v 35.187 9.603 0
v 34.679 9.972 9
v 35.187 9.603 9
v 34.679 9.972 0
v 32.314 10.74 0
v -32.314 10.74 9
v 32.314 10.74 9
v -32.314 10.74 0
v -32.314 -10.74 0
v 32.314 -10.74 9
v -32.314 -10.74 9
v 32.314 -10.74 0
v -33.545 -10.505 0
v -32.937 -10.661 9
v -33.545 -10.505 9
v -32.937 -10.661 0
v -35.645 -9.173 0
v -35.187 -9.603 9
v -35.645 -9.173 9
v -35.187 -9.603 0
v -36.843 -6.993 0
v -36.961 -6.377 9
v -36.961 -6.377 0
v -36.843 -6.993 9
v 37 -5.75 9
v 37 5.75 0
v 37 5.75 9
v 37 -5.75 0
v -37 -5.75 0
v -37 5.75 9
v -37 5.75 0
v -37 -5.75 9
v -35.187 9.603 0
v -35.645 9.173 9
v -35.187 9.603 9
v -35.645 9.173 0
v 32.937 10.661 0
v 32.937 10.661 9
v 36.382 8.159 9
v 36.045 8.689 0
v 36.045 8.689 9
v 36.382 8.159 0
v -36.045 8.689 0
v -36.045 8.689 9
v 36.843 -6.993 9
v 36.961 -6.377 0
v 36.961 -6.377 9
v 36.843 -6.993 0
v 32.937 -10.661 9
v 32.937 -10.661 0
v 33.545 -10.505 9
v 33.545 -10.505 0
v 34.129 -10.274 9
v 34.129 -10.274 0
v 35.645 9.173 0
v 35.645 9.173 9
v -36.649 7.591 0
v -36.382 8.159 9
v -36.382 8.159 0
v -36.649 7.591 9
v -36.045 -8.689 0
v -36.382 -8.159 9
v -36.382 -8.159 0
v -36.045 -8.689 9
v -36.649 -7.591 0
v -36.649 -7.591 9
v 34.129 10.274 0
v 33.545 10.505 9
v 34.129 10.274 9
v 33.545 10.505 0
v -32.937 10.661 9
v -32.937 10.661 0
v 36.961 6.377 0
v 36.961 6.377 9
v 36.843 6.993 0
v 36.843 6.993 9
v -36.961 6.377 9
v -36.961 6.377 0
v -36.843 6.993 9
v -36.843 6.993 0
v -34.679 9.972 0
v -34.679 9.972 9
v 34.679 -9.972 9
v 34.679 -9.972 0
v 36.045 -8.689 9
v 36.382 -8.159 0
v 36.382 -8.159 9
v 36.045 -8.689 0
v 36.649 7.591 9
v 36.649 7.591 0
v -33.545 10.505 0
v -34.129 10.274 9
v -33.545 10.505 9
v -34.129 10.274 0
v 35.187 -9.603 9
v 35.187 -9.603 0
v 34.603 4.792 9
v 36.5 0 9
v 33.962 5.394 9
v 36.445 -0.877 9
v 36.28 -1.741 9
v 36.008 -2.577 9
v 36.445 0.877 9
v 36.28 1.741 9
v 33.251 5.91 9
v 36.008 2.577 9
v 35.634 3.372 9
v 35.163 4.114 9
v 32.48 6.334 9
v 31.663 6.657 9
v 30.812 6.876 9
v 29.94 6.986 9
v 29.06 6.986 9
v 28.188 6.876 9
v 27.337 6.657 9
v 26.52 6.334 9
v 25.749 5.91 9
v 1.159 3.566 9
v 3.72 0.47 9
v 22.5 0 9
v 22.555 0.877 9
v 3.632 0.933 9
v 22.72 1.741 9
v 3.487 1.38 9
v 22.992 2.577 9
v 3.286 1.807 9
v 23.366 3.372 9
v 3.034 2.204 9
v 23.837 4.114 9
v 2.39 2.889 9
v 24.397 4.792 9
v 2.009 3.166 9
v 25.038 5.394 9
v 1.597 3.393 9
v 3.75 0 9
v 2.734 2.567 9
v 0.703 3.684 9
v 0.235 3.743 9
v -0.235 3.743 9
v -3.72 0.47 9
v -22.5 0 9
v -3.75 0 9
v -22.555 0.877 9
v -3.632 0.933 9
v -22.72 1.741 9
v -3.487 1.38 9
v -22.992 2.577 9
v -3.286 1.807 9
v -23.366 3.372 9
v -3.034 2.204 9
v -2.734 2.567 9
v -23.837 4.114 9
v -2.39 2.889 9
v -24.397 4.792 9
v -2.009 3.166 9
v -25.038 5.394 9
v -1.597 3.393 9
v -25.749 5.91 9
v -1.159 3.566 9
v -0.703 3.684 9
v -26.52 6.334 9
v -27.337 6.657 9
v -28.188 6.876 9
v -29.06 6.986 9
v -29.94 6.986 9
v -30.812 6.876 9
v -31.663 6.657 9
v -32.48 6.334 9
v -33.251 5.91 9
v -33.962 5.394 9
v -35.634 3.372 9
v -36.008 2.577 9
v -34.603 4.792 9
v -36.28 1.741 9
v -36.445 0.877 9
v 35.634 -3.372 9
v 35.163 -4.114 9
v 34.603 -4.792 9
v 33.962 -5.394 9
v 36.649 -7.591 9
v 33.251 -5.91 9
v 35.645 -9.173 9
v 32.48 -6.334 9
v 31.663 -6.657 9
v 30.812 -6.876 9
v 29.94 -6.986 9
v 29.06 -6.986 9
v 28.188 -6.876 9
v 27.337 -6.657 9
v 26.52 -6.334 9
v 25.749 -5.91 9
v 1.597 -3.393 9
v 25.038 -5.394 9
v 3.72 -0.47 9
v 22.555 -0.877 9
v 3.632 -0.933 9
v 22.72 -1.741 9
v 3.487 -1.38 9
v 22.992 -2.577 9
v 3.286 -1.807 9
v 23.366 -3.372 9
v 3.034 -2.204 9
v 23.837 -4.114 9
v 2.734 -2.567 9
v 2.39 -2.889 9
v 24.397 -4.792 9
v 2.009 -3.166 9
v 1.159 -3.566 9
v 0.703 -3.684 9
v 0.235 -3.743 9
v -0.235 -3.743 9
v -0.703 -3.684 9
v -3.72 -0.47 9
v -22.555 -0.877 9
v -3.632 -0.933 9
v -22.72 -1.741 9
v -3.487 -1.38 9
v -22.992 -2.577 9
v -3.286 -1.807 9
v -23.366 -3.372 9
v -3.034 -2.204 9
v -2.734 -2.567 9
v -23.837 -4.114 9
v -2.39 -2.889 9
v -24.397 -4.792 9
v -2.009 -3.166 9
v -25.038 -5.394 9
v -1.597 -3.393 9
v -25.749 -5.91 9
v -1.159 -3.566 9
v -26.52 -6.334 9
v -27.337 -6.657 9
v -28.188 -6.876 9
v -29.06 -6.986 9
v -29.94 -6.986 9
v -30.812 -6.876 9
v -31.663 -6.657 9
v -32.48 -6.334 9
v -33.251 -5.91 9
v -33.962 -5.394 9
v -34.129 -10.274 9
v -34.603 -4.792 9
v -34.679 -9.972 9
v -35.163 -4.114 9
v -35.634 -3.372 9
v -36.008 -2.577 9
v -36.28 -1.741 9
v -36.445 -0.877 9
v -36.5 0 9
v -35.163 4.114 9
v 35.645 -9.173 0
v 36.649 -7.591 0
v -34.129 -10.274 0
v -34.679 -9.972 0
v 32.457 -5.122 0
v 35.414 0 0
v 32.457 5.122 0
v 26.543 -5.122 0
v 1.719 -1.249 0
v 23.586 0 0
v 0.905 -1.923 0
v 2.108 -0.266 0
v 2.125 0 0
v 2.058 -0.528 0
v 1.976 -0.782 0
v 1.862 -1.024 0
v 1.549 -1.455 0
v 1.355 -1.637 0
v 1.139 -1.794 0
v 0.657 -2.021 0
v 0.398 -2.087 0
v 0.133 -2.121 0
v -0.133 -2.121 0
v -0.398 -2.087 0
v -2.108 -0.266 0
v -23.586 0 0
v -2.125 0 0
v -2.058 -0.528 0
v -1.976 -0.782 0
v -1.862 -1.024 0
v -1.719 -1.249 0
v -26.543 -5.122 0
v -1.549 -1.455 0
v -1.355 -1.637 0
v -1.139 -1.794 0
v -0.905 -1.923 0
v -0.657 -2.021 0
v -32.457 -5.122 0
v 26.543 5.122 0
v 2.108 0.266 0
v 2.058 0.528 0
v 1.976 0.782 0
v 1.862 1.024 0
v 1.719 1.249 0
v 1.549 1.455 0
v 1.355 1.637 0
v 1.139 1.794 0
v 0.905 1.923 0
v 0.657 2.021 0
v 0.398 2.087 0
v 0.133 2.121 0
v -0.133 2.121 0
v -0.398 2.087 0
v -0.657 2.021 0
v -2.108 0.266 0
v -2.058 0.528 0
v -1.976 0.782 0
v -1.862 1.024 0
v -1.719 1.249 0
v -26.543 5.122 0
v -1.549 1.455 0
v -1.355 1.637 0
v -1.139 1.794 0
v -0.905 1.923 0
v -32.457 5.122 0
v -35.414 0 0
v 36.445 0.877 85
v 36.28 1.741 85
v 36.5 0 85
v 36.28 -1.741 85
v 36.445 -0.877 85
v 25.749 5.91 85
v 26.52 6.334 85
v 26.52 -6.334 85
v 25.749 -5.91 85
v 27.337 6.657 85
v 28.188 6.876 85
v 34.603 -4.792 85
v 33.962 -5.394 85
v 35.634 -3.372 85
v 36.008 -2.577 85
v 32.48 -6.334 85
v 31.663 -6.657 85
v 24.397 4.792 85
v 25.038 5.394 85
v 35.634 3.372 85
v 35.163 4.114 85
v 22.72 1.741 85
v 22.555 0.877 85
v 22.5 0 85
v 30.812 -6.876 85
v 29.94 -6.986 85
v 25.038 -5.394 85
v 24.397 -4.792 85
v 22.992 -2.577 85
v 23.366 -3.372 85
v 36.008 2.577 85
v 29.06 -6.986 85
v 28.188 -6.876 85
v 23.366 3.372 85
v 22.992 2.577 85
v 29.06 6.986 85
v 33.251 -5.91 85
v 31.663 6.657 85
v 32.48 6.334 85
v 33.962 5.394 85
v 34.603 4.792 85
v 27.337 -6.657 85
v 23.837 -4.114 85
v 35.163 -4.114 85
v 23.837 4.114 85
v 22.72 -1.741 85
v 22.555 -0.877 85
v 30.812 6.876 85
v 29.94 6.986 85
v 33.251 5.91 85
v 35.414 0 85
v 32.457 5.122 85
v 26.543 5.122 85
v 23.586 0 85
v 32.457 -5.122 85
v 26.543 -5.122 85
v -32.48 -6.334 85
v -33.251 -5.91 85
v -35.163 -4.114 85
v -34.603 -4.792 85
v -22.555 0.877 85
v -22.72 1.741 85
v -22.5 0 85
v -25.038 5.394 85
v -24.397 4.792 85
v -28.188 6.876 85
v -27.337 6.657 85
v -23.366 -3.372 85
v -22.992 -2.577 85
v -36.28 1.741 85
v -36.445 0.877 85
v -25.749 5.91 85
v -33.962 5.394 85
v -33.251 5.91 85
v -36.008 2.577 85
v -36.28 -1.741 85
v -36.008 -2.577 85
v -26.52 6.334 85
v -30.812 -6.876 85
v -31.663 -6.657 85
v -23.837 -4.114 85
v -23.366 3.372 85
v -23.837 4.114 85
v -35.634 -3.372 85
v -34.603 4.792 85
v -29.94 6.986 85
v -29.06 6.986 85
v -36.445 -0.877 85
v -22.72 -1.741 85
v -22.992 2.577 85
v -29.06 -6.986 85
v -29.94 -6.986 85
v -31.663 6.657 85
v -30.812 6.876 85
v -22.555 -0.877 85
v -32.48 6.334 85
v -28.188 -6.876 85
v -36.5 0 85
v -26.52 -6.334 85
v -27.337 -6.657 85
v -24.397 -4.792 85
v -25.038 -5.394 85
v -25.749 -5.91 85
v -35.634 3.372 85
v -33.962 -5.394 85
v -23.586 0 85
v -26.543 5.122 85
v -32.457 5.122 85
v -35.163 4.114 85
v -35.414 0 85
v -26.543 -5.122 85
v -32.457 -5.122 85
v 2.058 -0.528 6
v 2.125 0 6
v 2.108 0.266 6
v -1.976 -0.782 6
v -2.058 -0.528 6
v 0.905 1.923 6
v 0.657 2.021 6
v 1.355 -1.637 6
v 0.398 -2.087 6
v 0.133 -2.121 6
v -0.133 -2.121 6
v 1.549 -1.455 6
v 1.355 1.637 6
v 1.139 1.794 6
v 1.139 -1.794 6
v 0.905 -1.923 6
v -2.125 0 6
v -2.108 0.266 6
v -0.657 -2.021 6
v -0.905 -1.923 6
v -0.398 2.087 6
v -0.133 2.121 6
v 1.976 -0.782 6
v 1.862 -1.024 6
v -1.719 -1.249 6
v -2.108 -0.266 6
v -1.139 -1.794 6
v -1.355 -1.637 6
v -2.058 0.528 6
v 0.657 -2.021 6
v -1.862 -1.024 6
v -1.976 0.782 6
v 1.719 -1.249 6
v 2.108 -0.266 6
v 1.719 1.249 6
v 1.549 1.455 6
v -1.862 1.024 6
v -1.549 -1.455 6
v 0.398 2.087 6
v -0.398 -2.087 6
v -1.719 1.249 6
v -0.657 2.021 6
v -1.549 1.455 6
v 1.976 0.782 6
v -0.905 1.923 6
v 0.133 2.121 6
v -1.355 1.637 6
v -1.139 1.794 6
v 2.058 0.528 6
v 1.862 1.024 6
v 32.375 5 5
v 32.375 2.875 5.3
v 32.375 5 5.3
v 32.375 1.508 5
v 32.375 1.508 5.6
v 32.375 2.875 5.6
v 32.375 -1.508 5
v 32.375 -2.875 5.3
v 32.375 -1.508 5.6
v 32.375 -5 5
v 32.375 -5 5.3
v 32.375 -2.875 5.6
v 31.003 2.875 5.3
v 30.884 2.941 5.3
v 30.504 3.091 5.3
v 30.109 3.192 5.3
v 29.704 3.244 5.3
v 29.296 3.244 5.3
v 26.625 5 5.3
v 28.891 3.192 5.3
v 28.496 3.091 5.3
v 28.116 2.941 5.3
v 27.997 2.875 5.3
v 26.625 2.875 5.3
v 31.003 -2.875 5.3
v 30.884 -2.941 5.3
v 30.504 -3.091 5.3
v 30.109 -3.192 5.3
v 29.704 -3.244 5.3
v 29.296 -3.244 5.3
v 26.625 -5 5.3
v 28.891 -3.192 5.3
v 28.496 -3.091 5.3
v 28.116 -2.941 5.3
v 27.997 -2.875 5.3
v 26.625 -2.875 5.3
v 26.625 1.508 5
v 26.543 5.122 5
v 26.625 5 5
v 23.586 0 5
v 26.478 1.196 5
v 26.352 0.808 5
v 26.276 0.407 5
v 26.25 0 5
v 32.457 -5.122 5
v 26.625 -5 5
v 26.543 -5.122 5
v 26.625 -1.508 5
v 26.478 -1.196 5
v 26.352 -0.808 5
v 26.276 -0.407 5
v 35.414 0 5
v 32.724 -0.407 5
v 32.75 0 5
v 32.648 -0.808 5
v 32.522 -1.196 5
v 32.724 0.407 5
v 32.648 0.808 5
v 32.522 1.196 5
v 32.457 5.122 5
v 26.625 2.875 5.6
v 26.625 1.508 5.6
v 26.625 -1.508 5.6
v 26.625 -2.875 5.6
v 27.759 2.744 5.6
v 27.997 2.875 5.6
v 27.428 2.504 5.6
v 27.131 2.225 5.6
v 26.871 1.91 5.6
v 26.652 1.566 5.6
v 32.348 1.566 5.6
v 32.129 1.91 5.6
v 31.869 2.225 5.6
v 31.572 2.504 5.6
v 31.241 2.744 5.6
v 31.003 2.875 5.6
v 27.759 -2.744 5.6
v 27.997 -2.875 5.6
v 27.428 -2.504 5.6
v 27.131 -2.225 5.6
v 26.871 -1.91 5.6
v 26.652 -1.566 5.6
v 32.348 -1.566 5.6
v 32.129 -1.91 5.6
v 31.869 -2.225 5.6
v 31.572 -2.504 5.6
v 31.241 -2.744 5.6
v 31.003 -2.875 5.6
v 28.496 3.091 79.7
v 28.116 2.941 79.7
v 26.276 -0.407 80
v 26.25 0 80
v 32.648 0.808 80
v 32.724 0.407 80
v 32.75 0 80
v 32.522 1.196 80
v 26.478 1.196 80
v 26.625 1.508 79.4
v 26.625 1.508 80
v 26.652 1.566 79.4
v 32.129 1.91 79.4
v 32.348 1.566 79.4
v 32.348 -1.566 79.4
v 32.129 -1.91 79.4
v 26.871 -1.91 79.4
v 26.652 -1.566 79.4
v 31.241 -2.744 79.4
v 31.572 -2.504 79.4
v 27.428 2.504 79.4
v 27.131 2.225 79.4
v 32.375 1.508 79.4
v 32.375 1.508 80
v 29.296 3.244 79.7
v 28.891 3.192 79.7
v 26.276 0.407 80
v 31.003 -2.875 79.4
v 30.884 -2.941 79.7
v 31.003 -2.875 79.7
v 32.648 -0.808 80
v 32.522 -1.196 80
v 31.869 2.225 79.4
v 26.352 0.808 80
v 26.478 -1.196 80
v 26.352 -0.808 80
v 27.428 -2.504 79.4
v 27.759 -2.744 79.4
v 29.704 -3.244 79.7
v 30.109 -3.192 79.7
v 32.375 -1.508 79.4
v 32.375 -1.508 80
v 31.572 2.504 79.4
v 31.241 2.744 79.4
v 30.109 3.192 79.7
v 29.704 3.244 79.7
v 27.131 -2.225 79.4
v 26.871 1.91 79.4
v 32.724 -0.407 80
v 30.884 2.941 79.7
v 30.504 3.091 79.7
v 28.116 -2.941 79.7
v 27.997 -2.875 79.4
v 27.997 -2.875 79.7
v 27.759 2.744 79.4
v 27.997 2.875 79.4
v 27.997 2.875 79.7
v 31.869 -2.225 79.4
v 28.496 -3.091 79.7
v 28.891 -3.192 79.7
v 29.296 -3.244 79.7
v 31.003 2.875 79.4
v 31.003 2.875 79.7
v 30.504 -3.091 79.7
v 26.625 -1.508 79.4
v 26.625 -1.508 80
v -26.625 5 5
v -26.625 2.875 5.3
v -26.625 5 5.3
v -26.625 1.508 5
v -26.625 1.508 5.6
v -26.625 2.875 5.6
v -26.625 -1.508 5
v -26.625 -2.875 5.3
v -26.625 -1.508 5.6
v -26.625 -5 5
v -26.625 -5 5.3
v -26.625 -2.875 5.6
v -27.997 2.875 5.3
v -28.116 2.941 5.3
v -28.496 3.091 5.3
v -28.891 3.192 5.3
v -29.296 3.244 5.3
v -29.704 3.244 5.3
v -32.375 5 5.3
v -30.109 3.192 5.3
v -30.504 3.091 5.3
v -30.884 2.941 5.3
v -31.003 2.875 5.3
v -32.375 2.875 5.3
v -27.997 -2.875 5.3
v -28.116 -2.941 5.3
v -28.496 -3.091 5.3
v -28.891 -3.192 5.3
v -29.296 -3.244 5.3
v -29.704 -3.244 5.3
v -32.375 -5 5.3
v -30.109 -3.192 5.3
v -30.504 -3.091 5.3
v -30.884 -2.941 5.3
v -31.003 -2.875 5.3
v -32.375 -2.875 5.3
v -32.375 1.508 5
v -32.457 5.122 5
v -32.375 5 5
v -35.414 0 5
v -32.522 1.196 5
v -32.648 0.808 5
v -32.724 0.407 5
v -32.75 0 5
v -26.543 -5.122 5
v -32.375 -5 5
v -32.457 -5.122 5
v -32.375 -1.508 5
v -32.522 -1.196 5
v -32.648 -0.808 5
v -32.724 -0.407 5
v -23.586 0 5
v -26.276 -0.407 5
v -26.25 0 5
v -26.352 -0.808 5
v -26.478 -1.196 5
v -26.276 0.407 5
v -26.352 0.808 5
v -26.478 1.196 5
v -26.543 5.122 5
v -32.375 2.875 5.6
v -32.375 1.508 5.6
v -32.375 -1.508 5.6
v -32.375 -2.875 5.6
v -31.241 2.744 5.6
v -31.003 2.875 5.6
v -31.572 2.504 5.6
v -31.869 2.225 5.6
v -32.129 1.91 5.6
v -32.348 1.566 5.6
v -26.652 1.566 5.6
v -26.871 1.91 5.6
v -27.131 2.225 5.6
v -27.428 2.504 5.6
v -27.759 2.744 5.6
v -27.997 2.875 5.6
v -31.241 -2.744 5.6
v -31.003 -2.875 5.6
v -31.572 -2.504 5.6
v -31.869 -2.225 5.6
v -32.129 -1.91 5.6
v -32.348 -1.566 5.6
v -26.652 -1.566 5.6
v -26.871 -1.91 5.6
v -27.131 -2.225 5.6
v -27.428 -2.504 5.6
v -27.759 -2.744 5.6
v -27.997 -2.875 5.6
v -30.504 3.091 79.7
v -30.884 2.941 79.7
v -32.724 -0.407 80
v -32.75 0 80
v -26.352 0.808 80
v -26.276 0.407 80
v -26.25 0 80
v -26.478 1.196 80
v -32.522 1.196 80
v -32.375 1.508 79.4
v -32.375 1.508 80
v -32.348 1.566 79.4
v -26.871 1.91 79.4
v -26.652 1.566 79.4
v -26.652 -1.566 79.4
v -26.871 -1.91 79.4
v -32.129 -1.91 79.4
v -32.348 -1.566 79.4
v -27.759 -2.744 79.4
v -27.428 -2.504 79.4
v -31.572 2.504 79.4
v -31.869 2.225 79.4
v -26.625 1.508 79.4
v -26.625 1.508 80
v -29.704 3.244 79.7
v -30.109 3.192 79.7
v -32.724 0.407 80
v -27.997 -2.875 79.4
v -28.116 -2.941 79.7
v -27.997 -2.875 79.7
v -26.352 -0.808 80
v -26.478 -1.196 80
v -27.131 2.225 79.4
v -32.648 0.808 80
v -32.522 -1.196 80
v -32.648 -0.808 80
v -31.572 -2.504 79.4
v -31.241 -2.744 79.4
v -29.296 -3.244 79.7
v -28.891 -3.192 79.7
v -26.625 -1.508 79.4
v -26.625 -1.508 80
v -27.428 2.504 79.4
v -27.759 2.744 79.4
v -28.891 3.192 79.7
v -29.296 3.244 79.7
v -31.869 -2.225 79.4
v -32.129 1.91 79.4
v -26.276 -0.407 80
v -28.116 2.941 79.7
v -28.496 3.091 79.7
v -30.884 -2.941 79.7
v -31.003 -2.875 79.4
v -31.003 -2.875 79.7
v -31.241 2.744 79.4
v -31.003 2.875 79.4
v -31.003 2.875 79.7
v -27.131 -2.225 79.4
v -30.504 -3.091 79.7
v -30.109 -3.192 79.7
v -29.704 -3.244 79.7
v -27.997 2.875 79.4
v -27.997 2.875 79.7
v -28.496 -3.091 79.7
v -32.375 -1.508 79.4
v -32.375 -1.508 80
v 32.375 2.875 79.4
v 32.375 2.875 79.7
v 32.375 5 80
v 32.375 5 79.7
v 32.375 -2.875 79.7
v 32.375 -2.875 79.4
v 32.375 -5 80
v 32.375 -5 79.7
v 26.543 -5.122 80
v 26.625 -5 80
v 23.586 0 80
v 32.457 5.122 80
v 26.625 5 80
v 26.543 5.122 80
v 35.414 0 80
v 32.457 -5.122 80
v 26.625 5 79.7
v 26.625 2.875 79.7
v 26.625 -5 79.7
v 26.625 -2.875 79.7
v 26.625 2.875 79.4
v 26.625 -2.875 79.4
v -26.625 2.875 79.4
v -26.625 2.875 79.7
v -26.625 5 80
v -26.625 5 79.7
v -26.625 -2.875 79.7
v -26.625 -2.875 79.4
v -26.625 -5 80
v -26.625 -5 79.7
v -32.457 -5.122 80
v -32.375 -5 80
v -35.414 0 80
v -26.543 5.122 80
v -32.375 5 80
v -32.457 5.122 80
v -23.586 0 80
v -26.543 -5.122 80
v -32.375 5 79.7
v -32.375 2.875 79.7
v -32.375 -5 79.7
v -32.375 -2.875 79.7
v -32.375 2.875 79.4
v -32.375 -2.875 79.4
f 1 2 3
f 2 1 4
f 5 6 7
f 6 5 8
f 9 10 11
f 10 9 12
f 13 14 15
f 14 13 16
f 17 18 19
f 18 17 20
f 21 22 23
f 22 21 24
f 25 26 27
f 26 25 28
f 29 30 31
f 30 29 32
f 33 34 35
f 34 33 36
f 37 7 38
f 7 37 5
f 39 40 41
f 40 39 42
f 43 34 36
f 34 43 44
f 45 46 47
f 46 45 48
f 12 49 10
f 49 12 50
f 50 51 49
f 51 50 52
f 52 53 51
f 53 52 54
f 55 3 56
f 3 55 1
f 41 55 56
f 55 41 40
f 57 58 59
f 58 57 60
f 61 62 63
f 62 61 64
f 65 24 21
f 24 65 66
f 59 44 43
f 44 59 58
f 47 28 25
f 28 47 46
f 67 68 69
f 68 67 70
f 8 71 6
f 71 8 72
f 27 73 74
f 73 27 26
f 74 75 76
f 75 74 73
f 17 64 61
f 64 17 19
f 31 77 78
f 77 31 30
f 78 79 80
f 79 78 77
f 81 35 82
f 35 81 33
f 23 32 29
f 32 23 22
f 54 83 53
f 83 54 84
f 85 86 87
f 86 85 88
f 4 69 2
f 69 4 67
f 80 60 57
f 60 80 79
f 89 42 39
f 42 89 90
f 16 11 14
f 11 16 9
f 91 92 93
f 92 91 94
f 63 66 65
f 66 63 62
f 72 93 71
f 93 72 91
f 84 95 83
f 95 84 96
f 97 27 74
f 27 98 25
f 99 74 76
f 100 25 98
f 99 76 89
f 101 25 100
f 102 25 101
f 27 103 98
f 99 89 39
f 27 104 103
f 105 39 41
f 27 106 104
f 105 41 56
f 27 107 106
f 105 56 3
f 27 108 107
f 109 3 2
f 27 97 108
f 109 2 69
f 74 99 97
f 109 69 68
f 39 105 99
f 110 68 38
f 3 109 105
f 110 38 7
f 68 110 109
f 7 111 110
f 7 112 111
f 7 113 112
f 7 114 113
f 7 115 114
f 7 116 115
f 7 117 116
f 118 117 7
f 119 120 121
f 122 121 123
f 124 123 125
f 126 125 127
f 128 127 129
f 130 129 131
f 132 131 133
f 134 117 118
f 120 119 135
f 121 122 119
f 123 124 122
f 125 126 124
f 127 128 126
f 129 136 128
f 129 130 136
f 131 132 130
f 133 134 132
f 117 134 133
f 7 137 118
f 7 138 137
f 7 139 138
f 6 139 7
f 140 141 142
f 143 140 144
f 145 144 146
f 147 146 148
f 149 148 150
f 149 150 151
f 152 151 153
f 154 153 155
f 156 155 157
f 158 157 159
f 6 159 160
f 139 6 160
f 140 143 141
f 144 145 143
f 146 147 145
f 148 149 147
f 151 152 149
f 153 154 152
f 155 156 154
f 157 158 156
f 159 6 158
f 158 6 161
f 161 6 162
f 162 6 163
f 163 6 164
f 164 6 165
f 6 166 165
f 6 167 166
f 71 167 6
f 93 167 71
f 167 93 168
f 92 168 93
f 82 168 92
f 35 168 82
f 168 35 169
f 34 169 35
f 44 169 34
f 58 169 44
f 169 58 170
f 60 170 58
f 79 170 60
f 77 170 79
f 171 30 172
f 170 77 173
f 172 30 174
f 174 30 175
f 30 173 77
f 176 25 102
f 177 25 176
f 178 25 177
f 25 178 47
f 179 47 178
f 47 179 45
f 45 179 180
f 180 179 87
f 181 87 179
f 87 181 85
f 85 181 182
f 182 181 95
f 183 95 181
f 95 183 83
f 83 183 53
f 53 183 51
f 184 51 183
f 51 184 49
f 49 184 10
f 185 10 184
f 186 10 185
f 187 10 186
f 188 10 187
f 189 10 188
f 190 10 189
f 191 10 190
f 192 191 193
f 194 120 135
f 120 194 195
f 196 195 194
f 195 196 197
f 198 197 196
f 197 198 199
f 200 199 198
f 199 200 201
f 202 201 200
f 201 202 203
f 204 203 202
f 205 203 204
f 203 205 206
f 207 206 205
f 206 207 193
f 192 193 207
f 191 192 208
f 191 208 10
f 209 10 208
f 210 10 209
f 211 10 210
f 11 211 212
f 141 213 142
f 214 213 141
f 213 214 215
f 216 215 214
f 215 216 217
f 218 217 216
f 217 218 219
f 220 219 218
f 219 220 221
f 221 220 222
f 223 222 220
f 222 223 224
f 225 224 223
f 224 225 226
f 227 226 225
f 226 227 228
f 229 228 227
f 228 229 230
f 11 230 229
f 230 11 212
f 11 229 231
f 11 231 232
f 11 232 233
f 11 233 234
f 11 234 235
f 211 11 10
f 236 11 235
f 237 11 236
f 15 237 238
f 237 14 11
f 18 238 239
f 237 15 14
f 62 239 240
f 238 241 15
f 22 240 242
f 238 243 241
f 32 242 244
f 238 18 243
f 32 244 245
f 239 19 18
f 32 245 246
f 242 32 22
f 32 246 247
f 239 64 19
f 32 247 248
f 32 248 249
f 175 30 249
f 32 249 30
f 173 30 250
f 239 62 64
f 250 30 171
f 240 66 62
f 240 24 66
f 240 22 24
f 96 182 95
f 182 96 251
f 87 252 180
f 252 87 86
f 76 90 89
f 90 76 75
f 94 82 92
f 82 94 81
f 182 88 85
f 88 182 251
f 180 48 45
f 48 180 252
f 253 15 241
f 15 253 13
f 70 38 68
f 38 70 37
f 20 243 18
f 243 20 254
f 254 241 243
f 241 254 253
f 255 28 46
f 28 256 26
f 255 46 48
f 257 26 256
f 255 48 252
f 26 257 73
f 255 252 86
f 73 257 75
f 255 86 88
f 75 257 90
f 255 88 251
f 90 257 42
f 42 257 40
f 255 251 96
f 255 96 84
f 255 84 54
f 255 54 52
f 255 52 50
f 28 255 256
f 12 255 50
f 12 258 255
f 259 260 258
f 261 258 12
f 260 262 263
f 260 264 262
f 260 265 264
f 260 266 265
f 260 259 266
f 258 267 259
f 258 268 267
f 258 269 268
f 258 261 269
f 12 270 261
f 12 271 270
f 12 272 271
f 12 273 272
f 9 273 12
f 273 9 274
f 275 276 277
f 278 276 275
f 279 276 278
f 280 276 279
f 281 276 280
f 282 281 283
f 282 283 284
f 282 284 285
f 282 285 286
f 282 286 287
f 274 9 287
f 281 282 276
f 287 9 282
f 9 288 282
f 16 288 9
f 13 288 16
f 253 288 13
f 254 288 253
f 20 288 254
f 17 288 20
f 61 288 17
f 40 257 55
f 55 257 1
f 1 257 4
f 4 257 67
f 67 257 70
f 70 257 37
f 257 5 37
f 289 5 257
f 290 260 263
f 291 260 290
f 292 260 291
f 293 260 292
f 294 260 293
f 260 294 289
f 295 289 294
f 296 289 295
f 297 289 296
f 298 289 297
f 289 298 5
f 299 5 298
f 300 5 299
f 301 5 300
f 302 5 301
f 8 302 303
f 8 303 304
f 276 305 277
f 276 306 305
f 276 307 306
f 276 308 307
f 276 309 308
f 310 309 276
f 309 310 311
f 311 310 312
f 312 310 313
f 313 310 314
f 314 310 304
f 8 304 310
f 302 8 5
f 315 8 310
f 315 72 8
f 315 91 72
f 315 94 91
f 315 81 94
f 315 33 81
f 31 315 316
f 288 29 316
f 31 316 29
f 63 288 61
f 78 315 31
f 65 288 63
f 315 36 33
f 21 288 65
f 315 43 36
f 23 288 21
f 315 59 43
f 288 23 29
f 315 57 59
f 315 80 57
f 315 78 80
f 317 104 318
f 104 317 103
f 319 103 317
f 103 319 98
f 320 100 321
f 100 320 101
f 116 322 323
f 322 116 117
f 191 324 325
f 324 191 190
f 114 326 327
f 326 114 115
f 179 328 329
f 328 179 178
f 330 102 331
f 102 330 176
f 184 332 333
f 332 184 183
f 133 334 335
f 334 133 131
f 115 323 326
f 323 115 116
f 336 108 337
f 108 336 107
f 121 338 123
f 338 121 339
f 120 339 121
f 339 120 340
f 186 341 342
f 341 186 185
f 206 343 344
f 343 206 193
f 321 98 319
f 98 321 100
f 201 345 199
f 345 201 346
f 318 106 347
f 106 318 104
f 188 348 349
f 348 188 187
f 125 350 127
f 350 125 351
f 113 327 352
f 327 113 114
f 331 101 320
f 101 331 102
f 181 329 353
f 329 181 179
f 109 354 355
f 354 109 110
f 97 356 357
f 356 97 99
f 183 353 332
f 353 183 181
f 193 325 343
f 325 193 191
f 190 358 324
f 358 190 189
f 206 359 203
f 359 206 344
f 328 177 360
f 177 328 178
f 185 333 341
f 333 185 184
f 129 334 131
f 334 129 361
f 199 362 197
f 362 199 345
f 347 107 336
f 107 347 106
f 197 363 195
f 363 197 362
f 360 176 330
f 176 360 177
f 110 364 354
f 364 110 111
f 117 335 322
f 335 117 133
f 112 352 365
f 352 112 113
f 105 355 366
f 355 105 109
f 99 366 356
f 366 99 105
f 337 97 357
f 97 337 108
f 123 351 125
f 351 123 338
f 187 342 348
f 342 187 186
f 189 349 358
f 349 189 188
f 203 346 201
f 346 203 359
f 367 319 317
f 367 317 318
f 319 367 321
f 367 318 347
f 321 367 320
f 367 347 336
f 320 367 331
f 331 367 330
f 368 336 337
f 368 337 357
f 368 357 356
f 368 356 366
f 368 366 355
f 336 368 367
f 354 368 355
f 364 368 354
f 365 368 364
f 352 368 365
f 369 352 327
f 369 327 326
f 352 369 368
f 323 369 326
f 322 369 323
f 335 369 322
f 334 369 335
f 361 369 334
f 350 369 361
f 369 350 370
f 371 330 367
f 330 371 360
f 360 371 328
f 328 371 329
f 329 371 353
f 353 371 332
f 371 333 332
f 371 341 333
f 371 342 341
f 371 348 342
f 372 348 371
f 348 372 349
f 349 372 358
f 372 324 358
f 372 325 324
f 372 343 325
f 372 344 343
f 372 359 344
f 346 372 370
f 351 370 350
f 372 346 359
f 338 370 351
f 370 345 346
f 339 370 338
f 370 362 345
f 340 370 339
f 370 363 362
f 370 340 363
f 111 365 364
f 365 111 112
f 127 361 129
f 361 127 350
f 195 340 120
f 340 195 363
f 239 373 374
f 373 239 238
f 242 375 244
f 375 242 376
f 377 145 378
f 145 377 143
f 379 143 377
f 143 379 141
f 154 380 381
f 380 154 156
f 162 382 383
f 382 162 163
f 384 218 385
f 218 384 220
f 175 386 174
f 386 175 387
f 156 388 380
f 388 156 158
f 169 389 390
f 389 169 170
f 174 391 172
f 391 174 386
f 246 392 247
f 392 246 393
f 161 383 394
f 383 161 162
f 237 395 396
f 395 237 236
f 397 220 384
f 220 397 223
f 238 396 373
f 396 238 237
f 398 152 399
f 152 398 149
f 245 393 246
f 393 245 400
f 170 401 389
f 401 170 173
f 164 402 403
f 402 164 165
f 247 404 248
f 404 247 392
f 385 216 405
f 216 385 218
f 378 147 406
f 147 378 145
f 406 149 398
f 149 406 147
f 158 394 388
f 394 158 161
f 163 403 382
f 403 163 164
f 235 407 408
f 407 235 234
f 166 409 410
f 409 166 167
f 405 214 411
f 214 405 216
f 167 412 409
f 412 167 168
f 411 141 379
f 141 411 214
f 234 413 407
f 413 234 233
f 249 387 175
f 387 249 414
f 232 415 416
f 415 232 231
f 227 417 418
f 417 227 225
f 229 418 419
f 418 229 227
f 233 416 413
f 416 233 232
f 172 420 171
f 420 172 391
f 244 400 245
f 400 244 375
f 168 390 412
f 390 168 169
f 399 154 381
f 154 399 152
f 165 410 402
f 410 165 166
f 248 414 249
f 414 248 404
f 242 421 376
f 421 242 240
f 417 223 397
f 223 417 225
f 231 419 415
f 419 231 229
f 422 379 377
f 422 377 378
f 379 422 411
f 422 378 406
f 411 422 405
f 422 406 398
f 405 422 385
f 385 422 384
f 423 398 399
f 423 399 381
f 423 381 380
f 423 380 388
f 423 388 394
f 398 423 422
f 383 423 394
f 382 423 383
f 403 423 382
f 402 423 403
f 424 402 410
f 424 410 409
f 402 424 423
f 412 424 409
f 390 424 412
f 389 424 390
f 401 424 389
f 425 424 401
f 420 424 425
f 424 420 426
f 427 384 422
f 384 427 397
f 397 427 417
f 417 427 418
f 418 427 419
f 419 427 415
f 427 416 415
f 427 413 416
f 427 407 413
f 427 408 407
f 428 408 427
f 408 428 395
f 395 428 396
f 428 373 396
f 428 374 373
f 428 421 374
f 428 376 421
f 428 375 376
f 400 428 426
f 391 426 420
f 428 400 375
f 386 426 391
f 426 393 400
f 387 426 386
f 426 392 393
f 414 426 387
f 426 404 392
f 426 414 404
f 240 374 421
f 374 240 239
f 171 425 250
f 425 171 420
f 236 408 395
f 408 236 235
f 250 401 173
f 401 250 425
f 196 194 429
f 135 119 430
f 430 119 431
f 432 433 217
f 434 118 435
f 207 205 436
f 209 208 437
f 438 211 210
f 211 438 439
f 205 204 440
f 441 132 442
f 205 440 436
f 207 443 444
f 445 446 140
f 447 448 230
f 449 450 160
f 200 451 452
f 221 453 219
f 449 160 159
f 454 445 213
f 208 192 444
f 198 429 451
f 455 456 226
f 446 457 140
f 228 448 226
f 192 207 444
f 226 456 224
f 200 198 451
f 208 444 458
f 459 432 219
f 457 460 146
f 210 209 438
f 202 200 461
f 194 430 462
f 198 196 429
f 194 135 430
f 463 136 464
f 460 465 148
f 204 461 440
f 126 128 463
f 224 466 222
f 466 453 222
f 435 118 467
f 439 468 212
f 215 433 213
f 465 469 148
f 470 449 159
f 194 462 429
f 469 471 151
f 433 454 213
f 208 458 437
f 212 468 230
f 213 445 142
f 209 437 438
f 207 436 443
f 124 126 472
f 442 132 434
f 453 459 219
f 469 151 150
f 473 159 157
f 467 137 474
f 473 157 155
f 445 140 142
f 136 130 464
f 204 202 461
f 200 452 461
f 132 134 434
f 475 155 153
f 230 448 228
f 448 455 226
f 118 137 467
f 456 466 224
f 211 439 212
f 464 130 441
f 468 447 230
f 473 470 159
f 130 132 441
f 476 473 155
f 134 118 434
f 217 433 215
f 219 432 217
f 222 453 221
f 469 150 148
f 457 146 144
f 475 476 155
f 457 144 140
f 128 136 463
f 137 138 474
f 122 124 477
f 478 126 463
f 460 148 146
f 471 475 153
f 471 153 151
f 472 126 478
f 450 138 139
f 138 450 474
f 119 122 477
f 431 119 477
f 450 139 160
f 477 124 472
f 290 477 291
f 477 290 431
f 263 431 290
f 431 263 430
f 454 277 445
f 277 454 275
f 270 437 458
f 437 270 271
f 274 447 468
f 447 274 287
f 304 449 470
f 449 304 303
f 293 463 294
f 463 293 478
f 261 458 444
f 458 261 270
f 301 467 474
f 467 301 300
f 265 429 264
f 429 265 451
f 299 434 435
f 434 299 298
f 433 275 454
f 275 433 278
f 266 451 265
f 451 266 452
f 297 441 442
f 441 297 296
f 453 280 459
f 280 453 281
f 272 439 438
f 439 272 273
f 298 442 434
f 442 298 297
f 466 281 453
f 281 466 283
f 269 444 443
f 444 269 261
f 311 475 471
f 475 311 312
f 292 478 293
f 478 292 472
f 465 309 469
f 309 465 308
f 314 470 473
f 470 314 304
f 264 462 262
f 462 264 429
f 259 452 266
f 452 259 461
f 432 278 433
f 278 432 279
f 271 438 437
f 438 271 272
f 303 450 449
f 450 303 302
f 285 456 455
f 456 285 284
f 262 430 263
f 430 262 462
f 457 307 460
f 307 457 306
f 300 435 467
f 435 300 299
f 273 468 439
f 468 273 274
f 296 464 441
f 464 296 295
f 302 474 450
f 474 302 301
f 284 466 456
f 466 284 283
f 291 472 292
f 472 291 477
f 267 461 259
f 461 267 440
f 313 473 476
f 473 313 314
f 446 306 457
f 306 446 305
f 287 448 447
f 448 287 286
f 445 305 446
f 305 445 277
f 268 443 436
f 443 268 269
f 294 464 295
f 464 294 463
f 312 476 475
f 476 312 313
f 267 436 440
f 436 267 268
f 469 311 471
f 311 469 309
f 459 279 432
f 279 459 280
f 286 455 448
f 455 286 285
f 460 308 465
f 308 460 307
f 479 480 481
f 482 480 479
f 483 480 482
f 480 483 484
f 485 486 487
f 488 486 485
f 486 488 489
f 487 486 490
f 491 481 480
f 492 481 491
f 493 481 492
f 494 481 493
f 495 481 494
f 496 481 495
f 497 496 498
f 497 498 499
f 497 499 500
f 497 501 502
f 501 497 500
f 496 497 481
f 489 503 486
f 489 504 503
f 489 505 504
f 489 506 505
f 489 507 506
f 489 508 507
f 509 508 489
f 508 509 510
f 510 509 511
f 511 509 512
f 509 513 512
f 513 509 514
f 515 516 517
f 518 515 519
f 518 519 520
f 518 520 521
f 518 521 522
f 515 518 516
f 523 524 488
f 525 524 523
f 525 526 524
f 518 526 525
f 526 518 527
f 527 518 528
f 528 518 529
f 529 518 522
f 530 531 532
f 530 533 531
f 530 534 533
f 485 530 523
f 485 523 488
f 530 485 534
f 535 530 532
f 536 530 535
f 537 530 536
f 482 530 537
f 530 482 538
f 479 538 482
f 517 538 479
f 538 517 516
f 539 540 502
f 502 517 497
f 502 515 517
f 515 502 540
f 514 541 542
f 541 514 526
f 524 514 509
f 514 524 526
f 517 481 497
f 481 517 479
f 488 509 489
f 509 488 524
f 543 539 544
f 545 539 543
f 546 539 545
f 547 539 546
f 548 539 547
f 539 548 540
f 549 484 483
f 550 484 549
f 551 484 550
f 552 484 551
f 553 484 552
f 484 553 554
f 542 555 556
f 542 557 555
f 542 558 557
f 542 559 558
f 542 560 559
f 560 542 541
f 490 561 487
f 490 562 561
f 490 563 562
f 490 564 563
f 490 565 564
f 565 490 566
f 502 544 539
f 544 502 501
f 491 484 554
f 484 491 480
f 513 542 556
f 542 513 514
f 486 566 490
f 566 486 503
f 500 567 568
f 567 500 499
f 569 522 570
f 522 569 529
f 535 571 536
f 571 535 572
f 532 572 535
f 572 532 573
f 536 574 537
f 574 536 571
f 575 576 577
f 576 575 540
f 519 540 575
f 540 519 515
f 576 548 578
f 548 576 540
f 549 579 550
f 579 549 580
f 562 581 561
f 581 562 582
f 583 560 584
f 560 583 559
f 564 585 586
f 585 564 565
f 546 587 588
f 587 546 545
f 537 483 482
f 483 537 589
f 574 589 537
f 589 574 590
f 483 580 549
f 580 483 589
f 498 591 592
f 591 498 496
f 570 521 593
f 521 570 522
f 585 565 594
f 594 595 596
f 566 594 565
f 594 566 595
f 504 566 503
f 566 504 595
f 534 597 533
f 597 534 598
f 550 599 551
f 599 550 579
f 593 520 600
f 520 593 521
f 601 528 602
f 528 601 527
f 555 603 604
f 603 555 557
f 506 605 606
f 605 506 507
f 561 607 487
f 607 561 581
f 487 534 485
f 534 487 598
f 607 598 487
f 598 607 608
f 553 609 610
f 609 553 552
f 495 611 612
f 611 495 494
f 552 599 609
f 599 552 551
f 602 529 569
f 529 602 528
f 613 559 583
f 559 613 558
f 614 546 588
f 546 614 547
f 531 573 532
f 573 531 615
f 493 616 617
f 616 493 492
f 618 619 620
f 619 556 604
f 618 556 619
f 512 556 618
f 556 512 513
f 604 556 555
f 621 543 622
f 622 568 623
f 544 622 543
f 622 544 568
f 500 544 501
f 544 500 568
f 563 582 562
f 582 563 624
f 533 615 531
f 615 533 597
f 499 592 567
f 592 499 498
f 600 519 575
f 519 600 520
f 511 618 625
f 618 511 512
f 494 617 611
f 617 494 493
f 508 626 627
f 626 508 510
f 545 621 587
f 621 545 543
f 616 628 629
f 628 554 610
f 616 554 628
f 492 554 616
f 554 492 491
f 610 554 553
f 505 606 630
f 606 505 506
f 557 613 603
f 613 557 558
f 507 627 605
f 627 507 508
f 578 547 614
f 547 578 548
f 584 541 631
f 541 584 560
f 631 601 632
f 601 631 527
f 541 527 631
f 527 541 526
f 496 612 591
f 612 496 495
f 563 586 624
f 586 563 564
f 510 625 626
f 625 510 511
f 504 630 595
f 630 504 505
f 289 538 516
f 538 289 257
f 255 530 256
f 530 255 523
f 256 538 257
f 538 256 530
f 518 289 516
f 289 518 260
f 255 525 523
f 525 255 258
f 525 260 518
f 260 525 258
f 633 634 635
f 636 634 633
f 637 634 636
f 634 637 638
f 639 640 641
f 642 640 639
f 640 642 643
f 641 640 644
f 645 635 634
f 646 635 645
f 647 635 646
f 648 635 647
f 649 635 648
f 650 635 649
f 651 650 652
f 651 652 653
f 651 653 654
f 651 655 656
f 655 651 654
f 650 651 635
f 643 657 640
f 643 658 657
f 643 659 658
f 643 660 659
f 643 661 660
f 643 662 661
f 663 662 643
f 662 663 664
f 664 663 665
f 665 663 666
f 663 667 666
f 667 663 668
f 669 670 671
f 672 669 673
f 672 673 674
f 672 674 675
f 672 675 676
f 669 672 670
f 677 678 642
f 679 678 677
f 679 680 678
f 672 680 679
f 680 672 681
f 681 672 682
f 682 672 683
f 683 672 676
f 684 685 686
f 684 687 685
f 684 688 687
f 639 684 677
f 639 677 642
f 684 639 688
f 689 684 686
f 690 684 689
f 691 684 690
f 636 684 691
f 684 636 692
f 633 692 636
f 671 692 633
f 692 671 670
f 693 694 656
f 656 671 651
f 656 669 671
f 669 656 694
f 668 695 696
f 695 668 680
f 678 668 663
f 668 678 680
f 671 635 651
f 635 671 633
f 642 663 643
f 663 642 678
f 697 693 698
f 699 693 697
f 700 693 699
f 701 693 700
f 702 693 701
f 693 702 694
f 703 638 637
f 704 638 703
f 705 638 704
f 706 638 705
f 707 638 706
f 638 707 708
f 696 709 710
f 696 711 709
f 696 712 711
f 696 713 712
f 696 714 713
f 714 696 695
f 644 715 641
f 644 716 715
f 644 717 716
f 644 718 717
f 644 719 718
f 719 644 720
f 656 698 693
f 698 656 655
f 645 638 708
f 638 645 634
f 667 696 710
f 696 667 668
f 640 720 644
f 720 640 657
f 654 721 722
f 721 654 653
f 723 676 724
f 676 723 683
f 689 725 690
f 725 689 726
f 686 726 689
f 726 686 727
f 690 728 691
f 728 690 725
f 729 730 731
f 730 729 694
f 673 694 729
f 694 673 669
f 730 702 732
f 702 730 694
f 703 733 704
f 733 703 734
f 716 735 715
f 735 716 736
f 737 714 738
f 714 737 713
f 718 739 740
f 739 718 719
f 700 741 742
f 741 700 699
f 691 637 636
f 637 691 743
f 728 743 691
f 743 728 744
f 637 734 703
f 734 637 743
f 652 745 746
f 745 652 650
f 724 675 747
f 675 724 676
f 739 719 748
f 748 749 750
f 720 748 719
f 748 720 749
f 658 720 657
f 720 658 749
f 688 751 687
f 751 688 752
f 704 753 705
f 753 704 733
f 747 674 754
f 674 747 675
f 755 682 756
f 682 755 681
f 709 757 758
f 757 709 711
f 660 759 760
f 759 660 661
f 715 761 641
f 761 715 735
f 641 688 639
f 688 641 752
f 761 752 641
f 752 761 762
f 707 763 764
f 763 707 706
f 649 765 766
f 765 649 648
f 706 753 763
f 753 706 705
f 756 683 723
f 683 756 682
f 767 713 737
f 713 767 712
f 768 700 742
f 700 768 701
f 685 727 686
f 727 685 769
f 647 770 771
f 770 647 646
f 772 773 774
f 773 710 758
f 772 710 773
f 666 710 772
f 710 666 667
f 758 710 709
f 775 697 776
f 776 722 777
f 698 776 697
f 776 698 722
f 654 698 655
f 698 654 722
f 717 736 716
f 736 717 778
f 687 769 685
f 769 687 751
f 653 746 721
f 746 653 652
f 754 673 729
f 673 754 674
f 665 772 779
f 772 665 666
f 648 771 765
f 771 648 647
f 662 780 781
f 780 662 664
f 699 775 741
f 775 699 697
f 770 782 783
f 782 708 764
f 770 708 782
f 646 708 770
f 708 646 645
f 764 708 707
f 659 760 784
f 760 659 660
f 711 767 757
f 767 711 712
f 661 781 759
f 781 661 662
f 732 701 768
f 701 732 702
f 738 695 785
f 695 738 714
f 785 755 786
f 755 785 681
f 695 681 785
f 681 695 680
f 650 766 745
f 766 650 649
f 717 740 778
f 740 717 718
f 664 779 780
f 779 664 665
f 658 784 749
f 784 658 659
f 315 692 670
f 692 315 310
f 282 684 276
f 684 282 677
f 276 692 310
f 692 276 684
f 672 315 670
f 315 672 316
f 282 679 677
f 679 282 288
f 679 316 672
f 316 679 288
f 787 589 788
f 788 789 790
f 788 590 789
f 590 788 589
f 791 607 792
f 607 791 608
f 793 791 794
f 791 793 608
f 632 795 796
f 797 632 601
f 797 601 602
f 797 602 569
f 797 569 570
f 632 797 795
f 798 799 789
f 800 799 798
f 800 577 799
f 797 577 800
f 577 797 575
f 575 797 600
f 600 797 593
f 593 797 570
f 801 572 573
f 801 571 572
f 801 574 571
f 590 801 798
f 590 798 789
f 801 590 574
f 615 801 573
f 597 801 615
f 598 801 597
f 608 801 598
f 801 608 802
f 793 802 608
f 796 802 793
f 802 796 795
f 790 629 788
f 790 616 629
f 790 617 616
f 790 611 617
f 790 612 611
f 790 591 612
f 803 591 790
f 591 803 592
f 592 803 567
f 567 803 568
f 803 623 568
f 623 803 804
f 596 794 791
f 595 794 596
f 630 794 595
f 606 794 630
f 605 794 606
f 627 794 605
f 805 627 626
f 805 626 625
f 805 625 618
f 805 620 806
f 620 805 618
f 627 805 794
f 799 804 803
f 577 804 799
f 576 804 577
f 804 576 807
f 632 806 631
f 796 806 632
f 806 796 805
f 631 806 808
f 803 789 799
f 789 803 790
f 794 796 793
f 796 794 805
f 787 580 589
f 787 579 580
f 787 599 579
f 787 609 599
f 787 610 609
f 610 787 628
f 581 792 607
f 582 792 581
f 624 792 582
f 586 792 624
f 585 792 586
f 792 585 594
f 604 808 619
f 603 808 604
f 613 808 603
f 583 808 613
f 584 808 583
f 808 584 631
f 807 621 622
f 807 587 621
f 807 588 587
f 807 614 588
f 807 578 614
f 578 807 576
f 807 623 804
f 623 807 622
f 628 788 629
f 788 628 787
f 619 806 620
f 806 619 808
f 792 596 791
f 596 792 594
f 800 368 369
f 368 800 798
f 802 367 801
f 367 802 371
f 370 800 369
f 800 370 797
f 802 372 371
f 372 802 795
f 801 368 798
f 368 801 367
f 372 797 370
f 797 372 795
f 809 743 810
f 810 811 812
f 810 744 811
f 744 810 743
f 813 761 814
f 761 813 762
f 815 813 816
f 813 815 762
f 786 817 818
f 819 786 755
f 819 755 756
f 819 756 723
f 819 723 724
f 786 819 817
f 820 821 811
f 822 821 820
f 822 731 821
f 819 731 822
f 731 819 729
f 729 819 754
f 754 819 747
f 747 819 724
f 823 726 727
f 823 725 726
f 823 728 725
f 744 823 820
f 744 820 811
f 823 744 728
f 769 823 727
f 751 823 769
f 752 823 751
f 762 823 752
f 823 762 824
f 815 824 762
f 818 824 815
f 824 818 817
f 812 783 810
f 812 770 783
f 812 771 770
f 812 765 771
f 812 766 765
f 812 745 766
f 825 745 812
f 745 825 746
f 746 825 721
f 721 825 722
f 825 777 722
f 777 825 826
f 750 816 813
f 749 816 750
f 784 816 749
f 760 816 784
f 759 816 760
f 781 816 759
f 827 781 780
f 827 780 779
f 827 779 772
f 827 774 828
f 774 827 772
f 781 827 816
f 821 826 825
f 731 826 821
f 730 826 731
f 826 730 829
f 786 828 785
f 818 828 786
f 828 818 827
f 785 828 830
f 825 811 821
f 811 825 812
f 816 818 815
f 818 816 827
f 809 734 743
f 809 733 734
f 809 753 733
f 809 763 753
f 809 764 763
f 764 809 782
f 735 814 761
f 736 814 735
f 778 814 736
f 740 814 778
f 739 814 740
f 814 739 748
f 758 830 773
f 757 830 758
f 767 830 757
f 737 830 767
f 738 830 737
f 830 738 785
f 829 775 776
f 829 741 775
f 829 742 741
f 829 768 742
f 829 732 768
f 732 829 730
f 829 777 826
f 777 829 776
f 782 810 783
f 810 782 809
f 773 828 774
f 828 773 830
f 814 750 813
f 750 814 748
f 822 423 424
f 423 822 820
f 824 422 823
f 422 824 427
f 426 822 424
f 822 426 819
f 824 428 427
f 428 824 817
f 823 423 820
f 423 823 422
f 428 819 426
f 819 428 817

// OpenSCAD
$fn = 50;


difference() {
	union() {
		hull() {
			translate(v = [-32.0000000000, 5.7500000000, 0]) {
				cylinder(h = 9, r = 5);
			}
			translate(v = [32.0000000000, 5.7500000000, 0]) {
				cylinder(h = 9, r = 5);
			}
			translate(v = [-32.0000000000, -5.7500000000, 0]) {
				cylinder(h = 9, r = 5);
			}
			translate(v = [32.0000000000, -5.7500000000, 0]) {
				cylinder(h = 9, r = 5);
			}
		}
		translate(v = [29.5000000000, 0, 0.0000000000]) {
			cylinder(h = 85, r = 7.0000000000);
		}
		translate(v = [-29.5000000000, 0, 0.0000000000]) {
			cylinder(h = 85, r = 7.0000000000);
		}
		translate(v = [29.5000000000, 0, 79.0000000000]) {
			cylinder(h = 6, r = 7.0000000000);
		}
		translate(v = [-29.5000000000, 0, 79.0000000000]) {
			cylinder(h = 6, r = 7.0000000000);
		}
	}
	union() {
		translate(v = [0, 0, 9]) {
			rotate(a = [0, 0, 0]) {
				difference() {
					union() {
						#translate(v = [0, 0, -80.0000000000]) {
							cylinder(h = 80, r = 2.0000000000);
						}
						#translate(v = [0, 0, -3]) {
							cylinder(h = 3, r1 = 2.1250000000, r2 = 3.7500000000);
						}
						#translate(v = [0, 0, -80.0000000000]) {
							cylinder(h = 80, r = 2.1250000000);
						}
						#translate(v = [0, 0, -80.0000000000]) {
							cylinder(h = 80, r = 2.0000000000);
						}
					}
					union();
				}
			}
		}
		translate(v = [29.5000000000, 0, 0]) {
			rotate(a = [0, 0, 0]) {
				difference() {
					union() {
						#translate(v = [-2.8750000000, -5.0000000000, -0.3000000000]) {
							cube(size = [5.7500000000, 10, 0.3000000000]);
						}
						#translate(v = [-2.8750000000, -2.8750000000, -0.6000000000]) {
							cube(size = [5.7500000000, 5.7500000000, 0.3000000000]);
						}
						#translate(v = [-2.8750000000, -5.0000000000, 5]) {
							cube(size = [5.7500000000, 10, 0.3000000000]);
						}
						#translate(v = [-2.8750000000, -2.8750000000, 5.3000000000]) {
							cube(size = [5.7500000000, 5.7500000000, 0.3000000000]);
						}
						#translate(v = [0, 0, -100.0000000000]) {
							cylinder(h = 200, r = 3.2500000000);
						}
						#linear_extrude(height = 5) {
							polygon(points = [[5.9142500000, 0.0000000000], [2.9571250000, 5.1218907443], [-2.9571250000, 5.1218907443], [-5.9142500000, 0.0000000000], [-2.9571250000, -5.1218907443], [2.9571250000, -5.1218907443]]);
						}
						#translate(v = [-2.8750000000, -5.0000000000, -0.3000000000]) {
							cube(size = [5.7500000000, 10, 0.3000000000]);
						}
						#translate(v = [-2.8750000000, -2.8750000000, -0.6000000000]) {
							cube(size = [5.7500000000, 5.7500000000, 0.3000000000]);
						}
						#translate(v = [-2.8750000000, -5.0000000000, 5]) {
							cube(size = [5.7500000000, 10, 0.3000000000]);
						}
						#translate(v = [-2.8750000000, -2.8750000000, 5.3000000000]) {
							cube(size = [5.7500000000, 5.7500000000, 0.3000000000]);
						}
						#translate(v = [0, 0, -100.0000000000]) {
							cylinder(h = 200, r = 3.2500000000);
						}
						#translate(v = [-2.8750000000, -5.0000000000, -0.3000000000]) {
							cube(size = [5.7500000000, 10, 0.3000000000]);
						}
						#translate(v = [-2.8750000000, -2.8750000000, -0.6000000000]) {
							cube(size = [5.7500000000, 5.7500000000, 0.3000000000]);
						}
						#translate(v = [-2.8750000000, -5.0000000000, 5]) {
							cube(size = [5.7500000000, 10, 0.3000000000]);
						}
						#translate(v = [-2.8750000000, -2.8750000000, 5.3000000000]) {
							cube(size = [5.7500000000, 5.7500000000, 0.3000000000]);
						}
						#translate(v = [0, 0, -100.0000000000]) {
							cylinder(h = 200, r = 3.2500000000);
						}
					}
					union();
				}
			}
		}
		translate(v = [-29.5000000000, 0, 0]) {
			rotate(a = [0, 0, 0]) {
				difference() {
					union() {
						#translate(v = [-2.8750000000, -5.0000000000, -0.3000000000]) {
							cube(size = [5.7500000000, 10, 0.3000000000]);
						}
						#translate(v = [-2.8750000000, -2.8750000000, -0.6000000000]) {
							cube(size = [5.7500000000, 5.7500000000, 0.3000000000]);
						}
						#translate(v = [-2.8750000000, -5.0000000000, 5]) {
							cube(size = [5.7500000000, 10, 0.3000000000]);
						}
						#translate(v = [-2.8750000000, -2.8750000000, 5.3000000000]) {
							cube(size = [5.7500000000, 5.7500000000, 0.3000000000]);
						}
						#translate(v = [0, 0, -100.0000000000]) {
							cylinder(h = 200, r = 3.2500000000);
						}
						#linear_extrude(height = 5) {
							polygon(points = [[5.9142500000, 0.0000000000], [2.9571250000, 5.1218907443], [-2.9571250000, 5.1218907443], [-5.9142500000, 0.0000000000], [-2.9571250000, -5.1218907443], [2.9571250000, -5.1218907443]]);
						}
						#translate(v = [-2.8750000000, -5.0000000000, -0.3000000000]) {
							cube(size = [5.7500000000, 10, 0.3000000000]);
						}
						#translate(v = [-2.8750000000, -2.8750000000, -0.6000000000]) {
							cube(size = [5.7500000000, 5.7500000000, 0.3000000000]);
						}
						#translate(v = [-2.8750000000, -5.0000000000, 5]) {
							cube(size = [5.7500000000, 10, 0.3000000000]);
						}
						#translate(v = [-2.8750000000, -2.8750000000, 5.3000000000]) {
							cube(size = [5.7500000000, 5.7500000000, 0.3000000000]);
						}
						#translate(v = [0, 0, -100.0000000000]) {
							cylinder(h = 200, r = 3.2500000000);
						}
						#translate(v = [-2.8750000000, -5.0000000000, -0.3000000000]) {
							cube(size = [5.7500000000, 10, 0.3000000000]);
						}
						#translate(v = [-2.8750000000, -2.8750000000, -0.6000000000]) {
							cube(size = [5.7500000000, 5.7500000000, 0.3000000000]);
						}
						#translate(v = [-2.8750000000, -5.0000000000, 5]) {
							cube(size = [5.7500000000, 10, 0.3000000000]);
						}
						#translate(v = [-2.8750000000, -2.8750000000, 5.3000000000]) {
							cube(size = [5.7500000000, 5.7500000000, 0.3000000000]);
						}
						#translate(v = [0, 0, -100.0000000000]) {
							cylinder(h = 200, r = 3.2500000000);
						}
					}
					union();
				}
			}
		}
		translate(v = [29.5000000000, 0, 85]) {
			rotate(a = [0, 0, 0]) {
				difference() {
					union() {
						#translate(v = [-2.8750000000, -5.0000000000, -5.3000000000]) {
							cube(size = [5.7500000000, 10, 0.3000000000]);
						}
						#translate(v = [-2.8750000000, -2.8750000000, -5.6000000000]) {
							cube(size = [5.7500000000, 5.7500000000, 0.3000000000]);
						}
						#translate(v = [-2.8750000000, -5.0000000000, 0]) {
							cube(size = [5.7500000000, 10, 0.3000000000]);
						}
						#translate(v = [-2.8750000000, -2.8750000000, 0.3000000000]) {
							cube(size = [5.7500000000, 5.7500000000, 0.3000000000]);
						}
						#translate(v = [0, 0, -100.0000000000]) {
							cylinder(h = 200, r = 3.2500000000);
						}
						translate(v = [0, 0, -5]) {
							#linear_extrude(height = 5) {
								polygon(points = [[5.9142500000, 0.0000000000], [2.9571250000, 5.1218907443], [-2.9571250000, 5.1218907443], [-5.9142500000, 0.0000000000], [-2.9571250000, -5.1218907443], [2.9571250000, -5.1218907443]]);
							}
						}
						#translate(v = [-2.8750000000, -5.0000000000, -5.3000000000]) {
							cube(size = [5.7500000000, 10, 0.3000000000]);
						}
						#translate(v = [-2.8750000000, -2.8750000000, -5.6000000000]) {
							cube(size = [5.7500000000, 5.7500000000, 0.3000000000]);
						}
						#translate(v = [-2.8750000000, -5.0000000000, 0]) {
							cube(size = [5.7500000000, 10, 0.3000000000]);
						}
						#translate(v = [-2.8750000000, -2.8750000000, 0.3000000000]) {
							cube(size = [5.7500000000, 5.7500000000, 0.3000000000]);
						}
						#translate(v = [0, 0, -100.0000000000]) {
							cylinder(h = 200, r = 3.2500000000);
						}
						#translate(v = [-2.8750000000, -5.0000000000, -5.3000000000]) {
							cube(size = [5.7500000000, 10, 0.3000000000]);
						}
						#translate(v = [-2.8750000000, -2.8750000000, -5.6000000000]) {
							cube(size = [5.7500000000, 5.7500000000, 0.3000000000]);
						}
						#translate(v = [-2.8750000000, -5.0000000000, 0]) {
							cube(size = [5.7500000000, 10, 0.3000000000]);
						}
						#translate(v = [-2.8750000000, -2.8750000000, 0.3000000000]) {
							cube(size = [5.7500000000, 5.7500000000, 0.3000000000]);
						}
						#translate(v = [0, 0, -100.0000000000]) {
							cylinder(h = 200, r = 3.2500000000);
						}
					}
					union();
				}
			}
		}
		translate(v = [-29.5000000000, 0, 85]) {
			rotate(a = [0, 0, 0]) {
				difference() {
					union() {
						#translate(v = [-2.8750000000, -5.0000000000, -5.3000000000]) {
							cube(size = [5.7500000000, 10, 0.3000000000]);
						}
						#translate(v = [-2.8750000000, -2.8750000000, -5.6000000000]) {
							cube(size = [5.7500000000, 5.7500000000, 0.3000000000]);
						}
						#translate(v = [-2.8750000000, -5.0000000000, 0]) {
							cube(size = [5.7500000000, 10, 0.3000000000]);
						}
						#translate(v = [-2.8750000000, -2.8750000000, 0.3000000000]) {
							cube(size = [5.7500000000, 5.7500000000, 0.3000000000]);
						}
						#translate(v = [0, 0, -100.0000000000]) {
							cylinder(h = 200, r = 3.2500000000);
						}
						translate(v = [0, 0, -5]) {
							#linear_extrude(height = 5) {
								polygon(points = [[5.9142500000, 0.0000000000], [2.9571250000, 5.1218907443], [-2.9571250000, 5.1218907443], [-5.9142500000, 0.0000000000], [-2.9571250000, -5.1218907443], [2.9571250000, -5.1218907443]]);
							}
						}
						#translate(v = [-2.8750000000, -5.0000000000, -5.3000000000]) {
							cube(size = [5.7500000000, 10, 0.3000000000]);
						}
						#translate(v = [-2.8750000000, -2.8750000000, -5.6000000000]) {
							cube(size = [5.7500000000, 5.7500000000, 0.3000000000]);
						}
						#translate(v = [-2.8750000000, -5.0000000000, 0]) {
							cube(size = [5.7500000000, 10, 0.3000000000]);
						}
						#translate(v = [-2.8750000000, -2.8750000000, 0.3000000000]) {
							cube(size = [5.7500000000, 5.7500000000, 0.3000000000]);
						}
						#translate(v = [0, 0, -100.0000000000]) {
							cylinder(h = 200, r = 3.2500000000);
						}
						#translate(v = [-2.8750000000, -5.0000000000, -5.3000000000]) {
							cube(size = [5.7500000000, 10, 0.3000000000]);
						}
						#translate(v = [-2.8750000000, -2.8750000000, -5.6000000000]) {
							cube(size = [5.7500000000, 5.7500000000, 0.3000000000]);
						}
						#translate(v = [-2.8750000000, -5.0000000000, 0]) {
							cube(size = [5.7500000000, 10, 0.3000000000]);
						}
						#translate(v = [-2.8750000000, -2.8750000000, 0.3000000000]) {
							cube(size = [5.7500000000, 5.7500000000, 0.3000000000]);
						}
						#translate(v = [0, 0, -100.0000000000]) {
							cylinder(h = 200, r = 3.2500000000);
						}
					}
					union();
				}
			}
		}
	}
}
